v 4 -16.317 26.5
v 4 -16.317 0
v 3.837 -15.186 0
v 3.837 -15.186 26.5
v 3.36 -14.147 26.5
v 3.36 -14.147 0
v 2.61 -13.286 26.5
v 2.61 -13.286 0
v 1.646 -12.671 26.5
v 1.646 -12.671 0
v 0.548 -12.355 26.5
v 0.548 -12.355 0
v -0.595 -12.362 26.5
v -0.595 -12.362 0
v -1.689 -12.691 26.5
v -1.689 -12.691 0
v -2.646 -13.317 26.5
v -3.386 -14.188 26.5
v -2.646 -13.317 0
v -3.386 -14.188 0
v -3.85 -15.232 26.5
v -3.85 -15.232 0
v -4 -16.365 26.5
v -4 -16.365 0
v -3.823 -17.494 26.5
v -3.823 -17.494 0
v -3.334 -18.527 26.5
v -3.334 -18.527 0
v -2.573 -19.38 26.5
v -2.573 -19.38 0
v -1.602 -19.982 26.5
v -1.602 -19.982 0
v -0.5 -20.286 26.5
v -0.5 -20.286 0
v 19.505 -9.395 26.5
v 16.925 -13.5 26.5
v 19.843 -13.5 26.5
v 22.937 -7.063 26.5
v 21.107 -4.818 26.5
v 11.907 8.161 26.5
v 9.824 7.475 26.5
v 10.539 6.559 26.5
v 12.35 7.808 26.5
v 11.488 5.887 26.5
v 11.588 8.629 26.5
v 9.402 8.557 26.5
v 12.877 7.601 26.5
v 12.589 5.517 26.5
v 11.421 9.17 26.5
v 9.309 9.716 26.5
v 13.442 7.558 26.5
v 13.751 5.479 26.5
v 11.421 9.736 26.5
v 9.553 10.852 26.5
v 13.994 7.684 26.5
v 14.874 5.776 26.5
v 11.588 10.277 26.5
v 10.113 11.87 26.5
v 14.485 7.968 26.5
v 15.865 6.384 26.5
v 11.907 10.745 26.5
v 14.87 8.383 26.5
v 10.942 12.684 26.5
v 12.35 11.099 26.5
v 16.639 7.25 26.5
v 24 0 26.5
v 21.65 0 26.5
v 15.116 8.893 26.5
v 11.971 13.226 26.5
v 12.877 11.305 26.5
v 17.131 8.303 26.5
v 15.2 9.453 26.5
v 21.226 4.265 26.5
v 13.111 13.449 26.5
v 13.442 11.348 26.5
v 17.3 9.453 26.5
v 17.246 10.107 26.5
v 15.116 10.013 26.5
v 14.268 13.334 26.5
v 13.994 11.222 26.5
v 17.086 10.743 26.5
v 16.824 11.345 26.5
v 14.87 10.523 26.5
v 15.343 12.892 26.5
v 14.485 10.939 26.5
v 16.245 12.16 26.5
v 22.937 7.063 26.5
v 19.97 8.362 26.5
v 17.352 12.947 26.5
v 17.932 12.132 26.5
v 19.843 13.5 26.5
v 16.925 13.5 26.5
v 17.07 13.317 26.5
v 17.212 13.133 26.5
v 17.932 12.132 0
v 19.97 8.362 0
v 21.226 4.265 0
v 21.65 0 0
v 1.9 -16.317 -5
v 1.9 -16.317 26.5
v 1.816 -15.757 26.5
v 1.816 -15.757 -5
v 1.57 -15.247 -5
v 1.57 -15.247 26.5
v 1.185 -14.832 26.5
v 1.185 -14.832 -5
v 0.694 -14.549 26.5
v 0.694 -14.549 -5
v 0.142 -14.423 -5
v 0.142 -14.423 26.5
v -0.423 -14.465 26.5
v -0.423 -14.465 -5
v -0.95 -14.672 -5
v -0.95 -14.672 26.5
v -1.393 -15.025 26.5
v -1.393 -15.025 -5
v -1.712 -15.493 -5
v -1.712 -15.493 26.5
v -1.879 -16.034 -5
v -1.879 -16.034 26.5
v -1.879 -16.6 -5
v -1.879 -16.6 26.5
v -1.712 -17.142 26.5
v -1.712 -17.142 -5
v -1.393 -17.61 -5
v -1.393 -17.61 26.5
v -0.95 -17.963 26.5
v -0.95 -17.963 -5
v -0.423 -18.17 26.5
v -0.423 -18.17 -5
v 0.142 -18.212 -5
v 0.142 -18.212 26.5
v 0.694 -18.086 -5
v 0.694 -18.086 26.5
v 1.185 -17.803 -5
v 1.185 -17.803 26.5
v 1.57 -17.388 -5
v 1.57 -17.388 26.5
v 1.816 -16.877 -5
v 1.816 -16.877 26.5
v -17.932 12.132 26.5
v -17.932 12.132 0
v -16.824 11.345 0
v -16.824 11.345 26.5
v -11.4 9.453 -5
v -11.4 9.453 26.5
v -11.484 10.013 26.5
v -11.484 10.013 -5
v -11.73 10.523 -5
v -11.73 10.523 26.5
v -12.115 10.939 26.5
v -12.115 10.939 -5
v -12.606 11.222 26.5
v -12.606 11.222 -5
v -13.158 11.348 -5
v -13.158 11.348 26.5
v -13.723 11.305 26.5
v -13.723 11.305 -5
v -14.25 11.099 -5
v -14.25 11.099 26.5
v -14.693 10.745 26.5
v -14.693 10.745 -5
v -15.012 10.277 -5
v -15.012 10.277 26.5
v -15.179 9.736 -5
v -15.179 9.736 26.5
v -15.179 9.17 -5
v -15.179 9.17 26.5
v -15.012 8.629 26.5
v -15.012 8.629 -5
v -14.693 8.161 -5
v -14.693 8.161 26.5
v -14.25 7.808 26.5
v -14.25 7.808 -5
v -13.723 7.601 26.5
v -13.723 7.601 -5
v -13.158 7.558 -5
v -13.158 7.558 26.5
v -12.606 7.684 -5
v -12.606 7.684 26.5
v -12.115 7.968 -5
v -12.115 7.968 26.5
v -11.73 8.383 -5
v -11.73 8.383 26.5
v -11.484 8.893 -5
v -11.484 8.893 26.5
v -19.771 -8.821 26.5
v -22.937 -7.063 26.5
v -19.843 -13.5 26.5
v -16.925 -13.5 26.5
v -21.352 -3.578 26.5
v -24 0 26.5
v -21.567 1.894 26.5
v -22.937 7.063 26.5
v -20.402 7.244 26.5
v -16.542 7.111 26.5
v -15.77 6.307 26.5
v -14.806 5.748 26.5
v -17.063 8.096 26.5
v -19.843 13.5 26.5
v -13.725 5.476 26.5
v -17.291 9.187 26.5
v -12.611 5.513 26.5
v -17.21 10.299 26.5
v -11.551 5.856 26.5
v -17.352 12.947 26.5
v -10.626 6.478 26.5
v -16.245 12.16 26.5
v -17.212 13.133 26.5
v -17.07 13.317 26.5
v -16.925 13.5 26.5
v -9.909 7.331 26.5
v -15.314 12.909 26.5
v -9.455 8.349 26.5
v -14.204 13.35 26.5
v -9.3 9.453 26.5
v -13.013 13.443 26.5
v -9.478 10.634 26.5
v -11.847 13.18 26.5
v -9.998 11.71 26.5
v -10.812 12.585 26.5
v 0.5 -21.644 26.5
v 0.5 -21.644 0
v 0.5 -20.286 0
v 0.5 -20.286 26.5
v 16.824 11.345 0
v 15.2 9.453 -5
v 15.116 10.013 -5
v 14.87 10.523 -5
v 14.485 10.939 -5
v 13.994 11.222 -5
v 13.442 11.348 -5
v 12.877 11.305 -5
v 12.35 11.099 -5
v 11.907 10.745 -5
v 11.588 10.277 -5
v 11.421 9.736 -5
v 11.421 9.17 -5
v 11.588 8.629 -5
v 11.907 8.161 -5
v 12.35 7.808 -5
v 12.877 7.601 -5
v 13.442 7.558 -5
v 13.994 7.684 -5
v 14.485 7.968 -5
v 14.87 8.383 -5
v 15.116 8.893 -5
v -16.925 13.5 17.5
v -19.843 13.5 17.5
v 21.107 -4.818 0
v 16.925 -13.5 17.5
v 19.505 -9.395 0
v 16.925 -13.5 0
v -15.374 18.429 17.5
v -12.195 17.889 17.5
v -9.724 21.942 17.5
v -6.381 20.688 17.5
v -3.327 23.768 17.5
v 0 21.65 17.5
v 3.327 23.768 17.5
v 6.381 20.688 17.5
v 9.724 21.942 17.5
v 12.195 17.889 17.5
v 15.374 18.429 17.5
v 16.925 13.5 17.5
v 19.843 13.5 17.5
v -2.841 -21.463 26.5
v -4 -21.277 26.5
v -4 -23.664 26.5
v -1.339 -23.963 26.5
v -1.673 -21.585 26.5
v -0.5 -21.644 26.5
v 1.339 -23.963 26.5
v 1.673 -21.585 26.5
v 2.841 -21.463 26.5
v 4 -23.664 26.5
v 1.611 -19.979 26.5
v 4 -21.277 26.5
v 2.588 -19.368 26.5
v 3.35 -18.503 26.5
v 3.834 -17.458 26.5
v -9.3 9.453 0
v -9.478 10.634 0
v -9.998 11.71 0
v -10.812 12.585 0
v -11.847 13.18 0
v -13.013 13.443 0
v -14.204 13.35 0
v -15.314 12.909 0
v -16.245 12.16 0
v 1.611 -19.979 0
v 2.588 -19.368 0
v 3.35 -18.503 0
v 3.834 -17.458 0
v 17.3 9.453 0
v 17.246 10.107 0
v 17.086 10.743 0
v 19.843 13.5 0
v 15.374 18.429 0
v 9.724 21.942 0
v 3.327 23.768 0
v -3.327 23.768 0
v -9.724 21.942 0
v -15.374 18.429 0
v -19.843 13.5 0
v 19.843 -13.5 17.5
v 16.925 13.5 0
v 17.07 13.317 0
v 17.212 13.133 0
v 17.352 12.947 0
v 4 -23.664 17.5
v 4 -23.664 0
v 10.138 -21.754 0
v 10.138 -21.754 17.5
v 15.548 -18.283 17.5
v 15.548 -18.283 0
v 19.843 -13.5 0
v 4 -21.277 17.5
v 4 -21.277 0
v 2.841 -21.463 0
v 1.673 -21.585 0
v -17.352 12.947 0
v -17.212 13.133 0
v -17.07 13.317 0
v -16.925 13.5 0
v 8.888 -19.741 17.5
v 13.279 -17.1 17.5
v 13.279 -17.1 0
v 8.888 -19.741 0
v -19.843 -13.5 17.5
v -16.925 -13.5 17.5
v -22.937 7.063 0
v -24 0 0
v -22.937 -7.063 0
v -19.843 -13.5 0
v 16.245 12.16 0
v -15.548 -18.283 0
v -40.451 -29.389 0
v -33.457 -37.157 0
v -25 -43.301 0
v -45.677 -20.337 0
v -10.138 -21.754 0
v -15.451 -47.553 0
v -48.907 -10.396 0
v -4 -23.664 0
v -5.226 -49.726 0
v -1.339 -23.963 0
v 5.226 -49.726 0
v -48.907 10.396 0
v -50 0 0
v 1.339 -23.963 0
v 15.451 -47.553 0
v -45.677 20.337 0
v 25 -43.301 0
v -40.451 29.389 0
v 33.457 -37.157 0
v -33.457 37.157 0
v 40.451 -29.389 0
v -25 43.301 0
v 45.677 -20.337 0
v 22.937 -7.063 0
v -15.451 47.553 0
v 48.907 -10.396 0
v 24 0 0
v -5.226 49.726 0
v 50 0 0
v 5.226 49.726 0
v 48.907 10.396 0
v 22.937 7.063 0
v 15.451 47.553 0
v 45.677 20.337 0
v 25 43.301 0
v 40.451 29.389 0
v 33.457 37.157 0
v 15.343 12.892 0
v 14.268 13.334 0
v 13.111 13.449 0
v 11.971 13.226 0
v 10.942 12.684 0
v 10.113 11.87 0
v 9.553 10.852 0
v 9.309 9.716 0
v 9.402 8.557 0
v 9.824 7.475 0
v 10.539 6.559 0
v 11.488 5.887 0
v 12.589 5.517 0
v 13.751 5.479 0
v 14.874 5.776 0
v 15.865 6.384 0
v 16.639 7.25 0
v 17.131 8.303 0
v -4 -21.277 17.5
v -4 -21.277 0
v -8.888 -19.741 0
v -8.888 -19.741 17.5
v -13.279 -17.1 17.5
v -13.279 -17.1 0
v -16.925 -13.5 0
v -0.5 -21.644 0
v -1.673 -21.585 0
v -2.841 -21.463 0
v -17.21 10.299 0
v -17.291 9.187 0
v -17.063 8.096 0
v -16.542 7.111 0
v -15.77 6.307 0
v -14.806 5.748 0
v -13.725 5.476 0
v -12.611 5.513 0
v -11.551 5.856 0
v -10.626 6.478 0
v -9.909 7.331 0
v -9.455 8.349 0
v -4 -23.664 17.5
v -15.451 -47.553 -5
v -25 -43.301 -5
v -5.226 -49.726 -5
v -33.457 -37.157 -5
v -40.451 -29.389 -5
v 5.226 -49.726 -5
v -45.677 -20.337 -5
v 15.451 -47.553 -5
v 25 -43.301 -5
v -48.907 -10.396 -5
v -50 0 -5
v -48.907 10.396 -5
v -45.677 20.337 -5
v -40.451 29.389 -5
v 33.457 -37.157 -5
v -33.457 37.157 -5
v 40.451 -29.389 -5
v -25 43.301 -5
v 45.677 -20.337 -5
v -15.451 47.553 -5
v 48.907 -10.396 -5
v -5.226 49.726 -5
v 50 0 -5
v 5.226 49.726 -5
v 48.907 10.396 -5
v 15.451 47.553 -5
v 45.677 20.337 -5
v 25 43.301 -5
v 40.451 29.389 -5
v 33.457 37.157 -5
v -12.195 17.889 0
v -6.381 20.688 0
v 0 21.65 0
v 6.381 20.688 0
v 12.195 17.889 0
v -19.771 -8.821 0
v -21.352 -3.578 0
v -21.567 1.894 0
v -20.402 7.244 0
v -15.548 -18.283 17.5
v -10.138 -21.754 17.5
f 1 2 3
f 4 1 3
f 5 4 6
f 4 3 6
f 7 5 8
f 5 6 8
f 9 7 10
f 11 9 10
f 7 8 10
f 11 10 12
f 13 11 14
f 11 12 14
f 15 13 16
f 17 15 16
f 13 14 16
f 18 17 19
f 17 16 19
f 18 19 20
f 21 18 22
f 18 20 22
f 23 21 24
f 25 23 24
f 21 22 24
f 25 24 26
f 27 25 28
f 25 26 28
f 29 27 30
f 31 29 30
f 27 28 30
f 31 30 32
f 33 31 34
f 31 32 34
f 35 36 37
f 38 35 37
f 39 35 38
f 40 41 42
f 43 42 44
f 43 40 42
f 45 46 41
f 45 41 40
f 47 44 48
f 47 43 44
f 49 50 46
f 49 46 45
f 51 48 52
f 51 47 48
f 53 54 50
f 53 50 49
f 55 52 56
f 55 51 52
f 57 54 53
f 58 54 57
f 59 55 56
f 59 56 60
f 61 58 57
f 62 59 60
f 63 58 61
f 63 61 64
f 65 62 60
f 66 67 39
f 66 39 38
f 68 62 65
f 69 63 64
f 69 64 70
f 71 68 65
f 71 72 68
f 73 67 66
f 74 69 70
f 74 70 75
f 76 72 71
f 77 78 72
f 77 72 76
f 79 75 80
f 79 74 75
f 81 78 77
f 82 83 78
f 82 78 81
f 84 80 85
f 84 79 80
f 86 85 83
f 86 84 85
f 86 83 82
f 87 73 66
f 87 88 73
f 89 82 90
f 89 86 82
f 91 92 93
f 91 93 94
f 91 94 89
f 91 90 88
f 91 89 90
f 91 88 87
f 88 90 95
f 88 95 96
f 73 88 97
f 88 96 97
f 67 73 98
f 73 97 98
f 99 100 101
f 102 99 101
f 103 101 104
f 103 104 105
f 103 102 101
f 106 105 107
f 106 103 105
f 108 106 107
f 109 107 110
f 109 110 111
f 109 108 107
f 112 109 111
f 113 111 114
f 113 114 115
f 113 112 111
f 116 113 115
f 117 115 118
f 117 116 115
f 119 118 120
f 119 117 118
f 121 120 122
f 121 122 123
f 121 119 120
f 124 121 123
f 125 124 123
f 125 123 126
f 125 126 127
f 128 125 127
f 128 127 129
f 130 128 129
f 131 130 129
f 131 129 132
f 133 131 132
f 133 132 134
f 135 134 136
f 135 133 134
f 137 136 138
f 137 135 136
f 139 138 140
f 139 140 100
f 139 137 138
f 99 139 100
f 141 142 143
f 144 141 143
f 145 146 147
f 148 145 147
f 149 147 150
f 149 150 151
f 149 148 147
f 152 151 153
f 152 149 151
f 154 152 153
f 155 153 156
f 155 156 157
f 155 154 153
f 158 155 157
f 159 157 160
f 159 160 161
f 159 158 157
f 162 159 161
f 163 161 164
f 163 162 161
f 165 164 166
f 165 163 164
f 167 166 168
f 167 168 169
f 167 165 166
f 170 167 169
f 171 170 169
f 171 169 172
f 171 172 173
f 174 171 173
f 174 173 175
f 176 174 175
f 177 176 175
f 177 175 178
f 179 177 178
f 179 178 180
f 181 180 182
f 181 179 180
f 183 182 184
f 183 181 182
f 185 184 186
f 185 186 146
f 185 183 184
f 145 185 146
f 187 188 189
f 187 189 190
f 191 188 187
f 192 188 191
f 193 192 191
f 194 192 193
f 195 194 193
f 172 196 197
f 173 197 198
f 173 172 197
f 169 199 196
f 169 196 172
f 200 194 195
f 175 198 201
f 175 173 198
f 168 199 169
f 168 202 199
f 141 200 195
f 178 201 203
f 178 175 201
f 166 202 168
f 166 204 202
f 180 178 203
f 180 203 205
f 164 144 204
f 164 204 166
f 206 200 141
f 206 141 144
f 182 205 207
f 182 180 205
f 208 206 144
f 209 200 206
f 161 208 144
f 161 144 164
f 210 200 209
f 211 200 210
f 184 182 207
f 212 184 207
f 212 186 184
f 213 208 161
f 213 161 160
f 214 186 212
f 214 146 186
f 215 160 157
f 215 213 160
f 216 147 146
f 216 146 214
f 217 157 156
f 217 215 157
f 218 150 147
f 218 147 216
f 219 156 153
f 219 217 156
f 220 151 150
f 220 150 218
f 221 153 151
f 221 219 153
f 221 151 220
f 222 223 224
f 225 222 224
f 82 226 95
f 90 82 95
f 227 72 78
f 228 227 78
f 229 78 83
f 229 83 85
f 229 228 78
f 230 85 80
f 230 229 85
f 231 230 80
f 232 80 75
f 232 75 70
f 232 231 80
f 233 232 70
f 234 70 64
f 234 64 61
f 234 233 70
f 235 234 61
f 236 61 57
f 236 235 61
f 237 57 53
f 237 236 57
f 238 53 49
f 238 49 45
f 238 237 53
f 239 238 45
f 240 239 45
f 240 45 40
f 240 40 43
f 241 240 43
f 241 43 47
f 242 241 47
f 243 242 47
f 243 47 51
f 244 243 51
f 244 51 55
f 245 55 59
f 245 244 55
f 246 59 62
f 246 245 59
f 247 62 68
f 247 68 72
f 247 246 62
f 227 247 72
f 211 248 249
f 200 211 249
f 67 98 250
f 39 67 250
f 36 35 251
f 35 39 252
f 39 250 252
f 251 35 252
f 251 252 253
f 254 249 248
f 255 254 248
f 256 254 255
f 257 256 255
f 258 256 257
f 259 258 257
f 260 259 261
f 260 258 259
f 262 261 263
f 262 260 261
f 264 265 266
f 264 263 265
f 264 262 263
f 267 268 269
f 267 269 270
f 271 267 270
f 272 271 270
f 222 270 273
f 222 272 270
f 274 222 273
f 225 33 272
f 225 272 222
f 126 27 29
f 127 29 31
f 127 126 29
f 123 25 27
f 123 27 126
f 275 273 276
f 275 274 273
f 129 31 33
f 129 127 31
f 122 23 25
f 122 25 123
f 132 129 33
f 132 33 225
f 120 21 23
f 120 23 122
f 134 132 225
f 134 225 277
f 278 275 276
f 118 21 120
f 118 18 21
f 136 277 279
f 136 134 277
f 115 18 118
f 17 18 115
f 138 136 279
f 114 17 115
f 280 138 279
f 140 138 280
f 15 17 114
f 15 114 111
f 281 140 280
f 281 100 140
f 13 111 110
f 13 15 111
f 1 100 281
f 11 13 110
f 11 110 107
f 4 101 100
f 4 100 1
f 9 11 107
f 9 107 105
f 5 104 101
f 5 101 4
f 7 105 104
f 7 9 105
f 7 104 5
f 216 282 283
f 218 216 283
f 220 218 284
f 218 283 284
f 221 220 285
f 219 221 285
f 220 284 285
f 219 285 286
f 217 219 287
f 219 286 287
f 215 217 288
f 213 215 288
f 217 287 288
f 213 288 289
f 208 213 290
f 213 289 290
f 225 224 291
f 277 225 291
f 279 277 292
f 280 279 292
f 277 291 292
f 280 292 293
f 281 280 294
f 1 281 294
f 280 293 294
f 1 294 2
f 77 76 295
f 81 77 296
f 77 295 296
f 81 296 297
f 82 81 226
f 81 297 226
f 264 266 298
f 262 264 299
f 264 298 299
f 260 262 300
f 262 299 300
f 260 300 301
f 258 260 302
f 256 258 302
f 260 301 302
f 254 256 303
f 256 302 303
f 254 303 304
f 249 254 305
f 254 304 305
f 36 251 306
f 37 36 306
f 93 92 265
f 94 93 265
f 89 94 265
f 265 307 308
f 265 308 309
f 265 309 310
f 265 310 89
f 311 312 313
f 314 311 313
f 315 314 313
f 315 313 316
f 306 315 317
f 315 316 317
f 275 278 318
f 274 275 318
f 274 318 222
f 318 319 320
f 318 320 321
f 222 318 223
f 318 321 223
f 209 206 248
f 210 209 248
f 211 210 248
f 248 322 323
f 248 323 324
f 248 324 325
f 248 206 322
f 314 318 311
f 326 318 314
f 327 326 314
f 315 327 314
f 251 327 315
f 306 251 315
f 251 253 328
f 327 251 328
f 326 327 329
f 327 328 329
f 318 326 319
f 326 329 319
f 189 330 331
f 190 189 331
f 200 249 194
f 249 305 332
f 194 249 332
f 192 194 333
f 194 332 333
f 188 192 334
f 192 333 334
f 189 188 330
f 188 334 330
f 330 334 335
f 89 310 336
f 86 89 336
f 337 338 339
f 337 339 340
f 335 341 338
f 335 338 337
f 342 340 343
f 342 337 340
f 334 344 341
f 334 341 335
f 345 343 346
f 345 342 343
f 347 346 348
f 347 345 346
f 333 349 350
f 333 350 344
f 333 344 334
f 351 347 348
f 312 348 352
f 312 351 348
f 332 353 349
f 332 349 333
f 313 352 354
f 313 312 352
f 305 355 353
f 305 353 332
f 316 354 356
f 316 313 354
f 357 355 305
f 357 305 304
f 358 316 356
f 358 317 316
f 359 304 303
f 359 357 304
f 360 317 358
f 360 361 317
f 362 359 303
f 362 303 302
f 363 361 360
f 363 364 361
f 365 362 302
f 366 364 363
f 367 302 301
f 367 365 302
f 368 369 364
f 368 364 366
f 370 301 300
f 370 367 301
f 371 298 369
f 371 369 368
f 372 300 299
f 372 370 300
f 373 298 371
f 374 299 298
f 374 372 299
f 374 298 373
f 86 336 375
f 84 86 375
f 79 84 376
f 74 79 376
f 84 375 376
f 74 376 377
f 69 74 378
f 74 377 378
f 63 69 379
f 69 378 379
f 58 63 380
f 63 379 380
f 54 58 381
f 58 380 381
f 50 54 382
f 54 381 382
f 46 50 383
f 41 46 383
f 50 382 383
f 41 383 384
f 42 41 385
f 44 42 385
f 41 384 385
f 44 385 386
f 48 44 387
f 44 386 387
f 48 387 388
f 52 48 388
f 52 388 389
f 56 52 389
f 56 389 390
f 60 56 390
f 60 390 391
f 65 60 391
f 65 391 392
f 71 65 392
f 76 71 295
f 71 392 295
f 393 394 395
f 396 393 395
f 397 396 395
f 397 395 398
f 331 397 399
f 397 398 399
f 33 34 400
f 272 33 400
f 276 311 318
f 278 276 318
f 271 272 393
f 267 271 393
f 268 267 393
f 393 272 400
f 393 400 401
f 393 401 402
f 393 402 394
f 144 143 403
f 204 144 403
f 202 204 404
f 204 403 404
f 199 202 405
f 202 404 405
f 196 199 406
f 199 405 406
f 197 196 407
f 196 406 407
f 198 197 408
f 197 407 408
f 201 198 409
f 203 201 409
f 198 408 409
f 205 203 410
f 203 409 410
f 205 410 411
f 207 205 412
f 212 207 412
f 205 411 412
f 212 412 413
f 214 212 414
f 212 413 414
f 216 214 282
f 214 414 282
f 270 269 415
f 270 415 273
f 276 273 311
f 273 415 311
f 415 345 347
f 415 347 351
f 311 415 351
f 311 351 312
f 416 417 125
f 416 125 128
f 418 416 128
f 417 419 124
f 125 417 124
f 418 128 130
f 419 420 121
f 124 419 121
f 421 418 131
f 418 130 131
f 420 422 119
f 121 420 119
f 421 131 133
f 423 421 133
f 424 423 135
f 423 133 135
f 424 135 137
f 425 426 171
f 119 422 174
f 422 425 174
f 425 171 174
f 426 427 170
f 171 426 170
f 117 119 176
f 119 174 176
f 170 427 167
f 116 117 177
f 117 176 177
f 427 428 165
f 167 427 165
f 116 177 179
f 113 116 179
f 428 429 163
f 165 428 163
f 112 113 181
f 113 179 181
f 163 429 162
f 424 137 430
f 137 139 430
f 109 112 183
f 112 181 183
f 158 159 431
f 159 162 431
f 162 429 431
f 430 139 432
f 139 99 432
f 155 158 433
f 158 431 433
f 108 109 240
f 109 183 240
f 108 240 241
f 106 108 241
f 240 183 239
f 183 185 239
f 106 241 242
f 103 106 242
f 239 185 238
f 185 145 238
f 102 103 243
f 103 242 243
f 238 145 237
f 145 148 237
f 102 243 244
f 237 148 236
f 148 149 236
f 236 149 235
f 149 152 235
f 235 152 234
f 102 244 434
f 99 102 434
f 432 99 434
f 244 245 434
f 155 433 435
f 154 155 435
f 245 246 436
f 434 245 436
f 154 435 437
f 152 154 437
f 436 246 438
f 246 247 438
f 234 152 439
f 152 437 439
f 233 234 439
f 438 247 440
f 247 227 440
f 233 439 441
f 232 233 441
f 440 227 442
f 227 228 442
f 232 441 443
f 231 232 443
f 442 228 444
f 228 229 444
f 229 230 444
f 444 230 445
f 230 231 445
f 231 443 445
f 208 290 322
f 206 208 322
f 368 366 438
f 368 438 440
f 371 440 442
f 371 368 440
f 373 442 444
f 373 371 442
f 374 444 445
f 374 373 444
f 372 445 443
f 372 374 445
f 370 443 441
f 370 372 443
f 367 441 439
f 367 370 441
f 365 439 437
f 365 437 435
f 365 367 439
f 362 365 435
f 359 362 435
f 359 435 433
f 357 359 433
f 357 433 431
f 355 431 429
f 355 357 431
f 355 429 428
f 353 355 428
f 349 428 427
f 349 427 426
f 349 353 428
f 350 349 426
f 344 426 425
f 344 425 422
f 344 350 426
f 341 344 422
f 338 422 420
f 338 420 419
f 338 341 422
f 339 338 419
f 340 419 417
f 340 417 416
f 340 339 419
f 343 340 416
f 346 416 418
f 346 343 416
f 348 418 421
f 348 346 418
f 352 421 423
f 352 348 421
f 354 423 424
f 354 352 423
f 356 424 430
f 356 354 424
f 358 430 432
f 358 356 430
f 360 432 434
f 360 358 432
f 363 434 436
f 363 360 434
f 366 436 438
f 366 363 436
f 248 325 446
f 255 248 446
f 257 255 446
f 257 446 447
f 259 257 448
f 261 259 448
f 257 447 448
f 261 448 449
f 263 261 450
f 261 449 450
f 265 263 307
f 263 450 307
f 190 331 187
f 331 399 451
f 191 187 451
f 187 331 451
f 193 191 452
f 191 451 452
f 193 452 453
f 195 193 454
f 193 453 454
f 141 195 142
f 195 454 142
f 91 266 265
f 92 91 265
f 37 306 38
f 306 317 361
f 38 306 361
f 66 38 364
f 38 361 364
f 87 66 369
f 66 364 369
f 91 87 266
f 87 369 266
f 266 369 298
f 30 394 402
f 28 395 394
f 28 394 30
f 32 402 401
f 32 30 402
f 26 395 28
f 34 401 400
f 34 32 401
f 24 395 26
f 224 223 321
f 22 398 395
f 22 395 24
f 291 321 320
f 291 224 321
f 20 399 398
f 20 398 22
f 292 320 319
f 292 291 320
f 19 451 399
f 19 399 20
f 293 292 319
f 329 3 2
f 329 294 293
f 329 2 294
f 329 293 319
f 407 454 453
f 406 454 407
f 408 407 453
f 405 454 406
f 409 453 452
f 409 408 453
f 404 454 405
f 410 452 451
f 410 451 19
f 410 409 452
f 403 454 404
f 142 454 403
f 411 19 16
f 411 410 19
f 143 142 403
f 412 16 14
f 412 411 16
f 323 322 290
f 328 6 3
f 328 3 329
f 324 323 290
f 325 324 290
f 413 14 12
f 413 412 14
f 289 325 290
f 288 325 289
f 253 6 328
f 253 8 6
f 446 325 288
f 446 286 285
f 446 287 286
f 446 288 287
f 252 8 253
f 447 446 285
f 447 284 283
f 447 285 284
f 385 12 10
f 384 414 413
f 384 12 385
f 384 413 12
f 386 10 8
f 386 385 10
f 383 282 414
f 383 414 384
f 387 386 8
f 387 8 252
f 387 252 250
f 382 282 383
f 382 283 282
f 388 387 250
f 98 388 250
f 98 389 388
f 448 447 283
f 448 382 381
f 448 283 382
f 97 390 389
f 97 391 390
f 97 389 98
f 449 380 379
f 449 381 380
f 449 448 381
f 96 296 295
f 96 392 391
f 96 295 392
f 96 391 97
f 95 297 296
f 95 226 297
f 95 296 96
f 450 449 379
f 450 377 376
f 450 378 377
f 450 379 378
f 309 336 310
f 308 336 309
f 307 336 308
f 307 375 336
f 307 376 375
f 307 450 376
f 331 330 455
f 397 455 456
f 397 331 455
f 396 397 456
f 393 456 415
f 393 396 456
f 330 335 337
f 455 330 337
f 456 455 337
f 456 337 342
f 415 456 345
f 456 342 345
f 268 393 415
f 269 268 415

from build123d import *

# Parameters (mm, degrees)
F0_R     = 50
F0_R_2   = 1.9
F1_DEPTH = 5
F2_DEPTH = 17.5
F3_DEPTH = 26.5


# Not quite as in the source:
# - a feature names something its author has since deleted; it is built from what else it names


with BuildPart() as f1:
    # F0 (on Top) → F1 (new body)
    with BuildSketch(Plane.XY):
        Circle(F0_R)
        with BuildLine():
            ThreePointArc((19.843134833, 13.5), (22.9372539332, 7.0627460668), (24, 0))
            ThreePointArc((24, 0), (22.9372539332, -7.0627460668), (19.843134833, -13.5))
            ThreePointArc((19.843134833, -13.5), (12.9596340813, -20.2001951594), (4, -23.6643191324))
            ThreePointArc((4, -23.6643191324), (0, -24), (-4, -23.6643191324))
            ThreePointArc((-4, -23.6643191324), (-12.9596340813, -20.2001951594), (-19.843134833, -13.5))
            ThreePointArc((-19.843134833, -13.5), (-24, 0), (-19.843134833, 13.5))
            ThreePointArc((-19.843134833, 13.5), (0, 24), (19.843134833, 13.5))
        make_face(mode=Mode.SUBTRACT)
        with BuildLine():
            ThreePointArc((4, -23.6643191324), (12.9596340813, -20.2001951594), (19.843134833, -13.5))
            Line((19.843134833, -13.5), (16.9254985156, -13.5))
            ThreePointArc((16.9254985156, -13.5), (11.1620172865, -18.5507916299), (4, -21.2772766114))
            Line((4, -21.2772766114), (4, -23.6643191324))
        make_face()
        with BuildLine():
            ThreePointArc((19.843134833, -13.5), (22.9372539332, -7.0627460668), (24, 0))
            ThreePointArc((24, 0), (22.9372539332, 7.0627460668), (19.843134833, 13.5))
            Line((19.843134833, 13.5), (16.9254985156, 13.5))
            ThreePointArc((16.9254985156, 13.5), (17.1411453437, 13.2251138485), (17.3523282296, 12.9467835778))
            ThreePointArc((17.3523282296, 12.9467835778), (17.6467019836, 12.5425838288), (17.9316623557, 12.1316934169))
            ThreePointArc((17.9316623557, 12.1316934169), (20.6995530145, 6.3443679748), (21.65, 0))
            ThreePointArc((21.65, 0), (20.4347686904, -7.1514144453), (16.9254985156, -13.5))
            Line((16.9254985156, -13.5), (19.843134833, -13.5))
        make_face()
        with BuildLine():
            ThreePointArc((17.3523282296, 12.9467835778), (17.1411453437, 13.2251138485), (16.9254985156, 13.5))
            ThreePointArc((16.9254985156, 13.5), (0, 21.65), (-16.9254985156, 13.5))
            ThreePointArc((-16.9254985156, 13.5), (-17.1411453437, 13.2251138485), (-17.3523282296, 12.9467835778))
            Line((-17.3523282296, 12.9467835778), (-16.2451217298, 12.1598246122))
            ThreePointArc((-16.2451217298, 12.1598246122), (-11.8474999, 13.1800801892), (-9.3, 9.4531184965))
            ThreePointArc((-9.3, 9.4531184965), (-14.2752375549, 5.5738258146), (-16.8244558558, 11.3447344513))
            Line((-16.8244558558, 11.3447344513), (-17.9316623557, 12.1316934169))
            ThreePointArc((-17.9316623557, 12.1316934169), (-21.6333386895, -0.8492097177), (-16.9254985156, -13.5))
            ThreePointArc((-16.9254985156, -13.5), (-11.1620172865, -18.5507916299), (-4, -21.2772766114))
            ThreePointArc((-4, -21.2772766114), (-2.2574682461, -21.5319840497), (-0.5, -21.6442255579))
            Line((-0.5, -21.6442255579), (-0.5, -20.2858402491))
            ThreePointArc((-0.5, -20.2858402491), (-2.6457513111, -13.3172132825), (4, -16.3172132825))
            ThreePointArc((4, -16.3172132825), (3, -18.9629645936), (0.5, -20.2858402491))
            Line((0.5, -20.2858402491), (0.5, -21.6442255579))
            ThreePointArc((0.5, -21.6442255579), (2.2574682461, -21.5319840497), (4, -21.2772766114))
            ThreePointArc((4, -21.2772766114), (11.1620172865, -18.5507916299), (16.9254985156, -13.5))
            ThreePointArc((16.9254985156, -13.5), (20.4347686904, -7.1514144453), (21.65, 0))
            ThreePointArc((21.65, 0), (20.6995530145, 6.3443679748), (17.9316623557, 12.1316934169))
            Line((17.9316623557, 12.1316934169), (16.8244558558, 11.3447344513))
            ThreePointArc((16.8244558558, 11.3447344513), (17.1792926819, 10.4283560513), (17.3, 9.4531184965))
            ThreePointArc((17.3, 9.4531184965), (9.5730383072, 8.0006183965), (16.2451217298, 12.1598246122))
            Line((16.2451217298, 12.1598246122), (17.3523282296, 12.9467835778))
        make_face()
        with BuildLine():
            Line((16.9254985156, 13.5), (19.843134833, 13.5))
            ThreePointArc((19.843134833, 13.5), (0, 24), (-19.843134833, 13.5))
            Line((-19.843134833, 13.5), (-16.9254985156, 13.5))
            ThreePointArc((-16.9254985156, 13.5), (0, 21.65), (16.9254985156, 13.5))
        make_face()
        with BuildLine():
            ThreePointArc((-9.3, 9.4531184965), (-11.8474999, 13.1800801892), (-16.2451217298, 12.1598246122))
            ThreePointArc((-16.2451217298, 12.1598246122), (-16.5603606436, 11.7704550006), (-16.8244558558, 11.3447344513))
            ThreePointArc((-16.8244558558, 11.3447344513), (-14.2752375549, 5.5738258146), (-9.3, 9.4531184965))
        make_face()
        with Locations((-13.3, 9.4531184965)):
            Circle(F0_R_2, mode=Mode.SUBTRACT)
        with BuildLine():
            ThreePointArc((16.8244558558, 11.3447344513), (16.5603606436, 11.7704550006), (16.2451217298, 12.1598246122))
            ThreePointArc((16.2451217298, 12.1598246122), (9.5730383072, 8.0006183965), (17.3, 9.4531184965))
            ThreePointArc((17.3, 9.4531184965), (17.1792926819, 10.4283560513), (16.8244558558, 11.3447344513))
        make_face()
        with Locations((13.3, 9.4531184965)):
            Circle(F0_R_2, mode=Mode.SUBTRACT)
        with BuildLine():
            Line((-16.9254985156, 13.5), (-19.843134833, 13.5))
            ThreePointArc((-19.843134833, 13.5), (-24, 0), (-19.843134833, -13.5))
            Line((-19.843134833, -13.5), (-16.9254985156, -13.5))
            ThreePointArc((-16.9254985156, -13.5), (-21.6333386895, -0.8492097177), (-17.9316623557, 12.1316934169))
            ThreePointArc((-17.9316623557, 12.1316934169), (-17.6467019836, 12.5425838288), (-17.3523282296, 12.9467835778))
            ThreePointArc((-17.3523282296, 12.9467835778), (-17.1411453437, 13.2251138485), (-16.9254985156, 13.5))
        make_face()
        with BuildLine():
            Line((-16.9254985156, -13.5), (-19.843134833, -13.5))
            ThreePointArc((-19.843134833, -13.5), (-12.9596340813, -20.2001951594), (-4, -23.6643191324))
            Line((-4, -23.6643191324), (-4, -21.2772766114))
            ThreePointArc((-4, -21.2772766114), (-11.1620172865, -18.5507916299), (-16.9254985156, -13.5))
        make_face()
        with BuildLine():
            ThreePointArc((-4, -23.6643191324), (0, -24), (4, -23.6643191324))
            Line((4, -23.6643191324), (4, -21.2772766114))
            ThreePointArc((4, -21.2772766114), (2.2574682461, -21.5319840497), (0.5, -21.6442255579))
            ThreePointArc((0.5, -21.6442255579), (0, -21.65), (-0.5, -21.6442255579))
            ThreePointArc((-0.5, -21.6442255579), (-2.2574682461, -21.5319840497), (-4, -21.2772766114))
            Line((-4, -21.2772766114), (-4, -23.6643191324))
        make_face()
        with BuildLine():
            ThreePointArc((-0.5, -20.2858402491), (0, -20.3172132825), (0.5, -20.2858402491))
            ThreePointArc((0.5, -20.2858402491), (3, -18.9629645936), (4, -16.3172132825))
            ThreePointArc((4, -16.3172132825), (-2.6457513111, -13.3172132825), (-0.5, -20.2858402491))
        make_face()
        with Locations((0, -16.3172132825)):
            Circle(F0_R_2, mode=Mode.SUBTRACT)
        with BuildLine():
            ThreePointArc((-0.5, -21.6442255579), (0, -21.65), (0.5, -21.6442255579))
            Line((0.5, -21.6442255579), (0.5, -20.2858402491))
            ThreePointArc((0.5, -20.2858402491), (0, -20.3172132825), (-0.5, -20.2858402491))
            Line((-0.5, -20.2858402491), (-0.5, -21.6442255579))
        make_face()
        with BuildLine():
            ThreePointArc((17.9316623557, 12.1316934169), (17.6467019836, 12.5425838288), (17.3523282296, 12.9467835778))
            Line((17.3523282296, 12.9467835778), (16.2451217298, 12.1598246122))
            ThreePointArc((16.2451217298, 12.1598246122), (16.5603606436, 11.7704550006), (16.8244558558, 11.3447344513))
            Line((16.8244558558, 11.3447344513), (17.9316623557, 12.1316934169))
        make_face()
        with BuildLine():
            Line((-16.2451217298, 12.1598246122), (-17.3523282296, 12.9467835778))
            ThreePointArc((-17.3523282296, 12.9467835778), (-17.6467019836, 12.5425838288), (-17.9316623557, 12.1316934169))
            Line((-17.9316623557, 12.1316934169), (-16.8244558558, 11.3447344513))
            ThreePointArc((-16.8244558558, 11.3447344513), (-16.5603606436, 11.7704550006), (-16.2451217298, 12.1598246122))
        make_face()
    extrude(amount=-F1_DEPTH)

    # F0 (on Top) → F2 (join)
    with BuildSketch(Plane.XY):
        with BuildLine():
            ThreePointArc((4, -23.6643191324), (12.9596340813, -20.2001951594), (19.843134833, -13.5))
            Line((19.843134833, -13.5), (16.9254985156, -13.5))
            ThreePointArc((16.9254985156, -13.5), (11.1620172865, -18.5507916299), (4, -21.2772766114))
            Line((4, -21.2772766114), (4, -23.6643191324))
        make_face()
        with BuildLine():
            Line((-16.9254985156, -13.5), (-19.843134833, -13.5))
            ThreePointArc((-19.843134833, -13.5), (-12.9596340813, -20.2001951594), (-4, -23.6643191324))
            Line((-4, -23.6643191324), (-4, -21.2772766114))
            ThreePointArc((-4, -21.2772766114), (-11.1620172865, -18.5507916299), (-16.9254985156, -13.5))
        make_face()
        with BuildLine():
            Line((16.9254985156, 13.5), (19.843134833, 13.5))
            ThreePointArc((19.843134833, 13.5), (0, 24), (-19.843134833, 13.5))
            Line((-19.843134833, 13.5), (-16.9254985156, 13.5))
            ThreePointArc((-16.9254985156, 13.5), (0, 21.65), (16.9254985156, 13.5))
        make_face()
    extrude(amount=F2_DEPTH)

    # F0 (on Top) → F3 (join)
    with BuildSketch(Plane.XY):
        with BuildLine():
            Line((-16.9254985156, 13.5), (-19.843134833, 13.5))
            ThreePointArc((-19.843134833, 13.5), (-24, 0), (-19.843134833, -13.5))
            Line((-19.843134833, -13.5), (-16.9254985156, -13.5))
            ThreePointArc((-16.9254985156, -13.5), (-21.6333386895, -0.8492097177), (-17.9316623557, 12.1316934169))
            ThreePointArc((-17.9316623557, 12.1316934169), (-17.6467019836, 12.5425838288), (-17.3523282296, 12.9467835778))
            ThreePointArc((-17.3523282296, 12.9467835778), (-17.1411453437, 13.2251138485), (-16.9254985156, 13.5))
        make_face()
        with BuildLine():
            ThreePointArc((19.843134833, -13.5), (22.9372539332, -7.0627460668), (24, 0))
            ThreePointArc((24, 0), (22.9372539332, 7.0627460668), (19.843134833, 13.5))
            Line((19.843134833, 13.5), (16.9254985156, 13.5))
            ThreePointArc((16.9254985156, 13.5), (17.1411453437, 13.2251138485), (17.3523282296, 12.9467835778))
            ThreePointArc((17.3523282296, 12.9467835778), (17.6467019836, 12.5425838288), (17.9316623557, 12.1316934169))
            ThreePointArc((17.9316623557, 12.1316934169), (20.6995530145, 6.3443679748), (21.65, 0))
            ThreePointArc((21.65, 0), (20.4347686904, -7.1514144453), (16.9254985156, -13.5))
            Line((16.9254985156, -13.5), (19.843134833, -13.5))
        make_face()
        with BuildLine():
            ThreePointArc((16.8244558558, 11.3447344513), (16.5603606436, 11.7704550006), (16.2451217298, 12.1598246122))
            ThreePointArc((16.2451217298, 12.1598246122), (9.5730383072, 8.0006183965), (17.3, 9.4531184965))
            ThreePointArc((17.3, 9.4531184965), (17.1792926819, 10.4283560513), (16.8244558558, 11.3447344513))
        make_face()
        with Locations((13.3, 9.4531184965)):
            Circle(F0_R_2, mode=Mode.SUBTRACT)
        with BuildLine():
            ThreePointArc((-0.5, -20.2858402491), (0, -20.3172132825), (0.5, -20.2858402491))
            ThreePointArc((0.5, -20.2858402491), (3, -18.9629645936), (4, -16.3172132825))
            ThreePointArc((4, -16.3172132825), (-2.6457513111, -13.3172132825), (-0.5, -20.2858402491))
        make_face()
        with Locations((0, -16.3172132825)):
            Circle(F0_R_2, mode=Mode.SUBTRACT)
        with BuildLine():
            ThreePointArc((-0.5, -21.6442255579), (0, -21.65), (0.5, -21.6442255579))
            Line((0.5, -21.6442255579), (0.5, -20.2858402491))
            ThreePointArc((0.5, -20.2858402491), (0, -20.3172132825), (-0.5, -20.2858402491))
            Line((-0.5, -20.2858402491), (-0.5, -21.6442255579))
        make_face()
        with BuildLine():
            ThreePointArc((-4, -23.6643191324), (0, -24), (4, -23.6643191324))
            Line((4, -23.6643191324), (4, -21.2772766114))
            ThreePointArc((4, -21.2772766114), (2.2574682461, -21.5319840497), (0.5, -21.6442255579))
            ThreePointArc((0.5, -21.6442255579), (0, -21.65), (-0.5, -21.6442255579))
            ThreePointArc((-0.5, -21.6442255579), (-2.2574682461, -21.5319840497), (-4, -21.2772766114))
            Line((-4, -21.2772766114), (-4, -23.6643191324))
        make_face()
        with BuildLine():
            ThreePointArc((-9.3, 9.4531184965), (-11.8474999, 13.1800801892), (-16.2451217298, 12.1598246122))
            ThreePointArc((-16.2451217298, 12.1598246122), (-16.5603606436, 11.7704550006), (-16.8244558558, 11.3447344513))
            ThreePointArc((-16.8244558558, 11.3447344513), (-14.2752375549, 5.5738258146), (-9.3, 9.4531184965))
        make_face()
        with Locations((-13.3, 9.4531184965)):
            Circle(F0_R_2, mode=Mode.SUBTRACT)
        with BuildLine():
            Line((-16.2451217298, 12.1598246122), (-17.3523282296, 12.9467835778))
            ThreePointArc((-17.3523282296, 12.9467835778), (-17.6467019836, 12.5425838288), (-17.9316623557, 12.1316934169))
            Line((-17.9316623557, 12.1316934169), (-16.8244558558, 11.3447344513))
            ThreePointArc((-16.8244558558, 11.3447344513), (-16.5603606436, 11.7704550006), (-16.2451217298, 12.1598246122))
        make_face()
        with BuildLine():
            ThreePointArc((17.9316623557, 12.1316934169), (17.6467019836, 12.5425838288), (17.3523282296, 12.9467835778))
            Line((17.3523282296, 12.9467835778), (16.2451217298, 12.1598246122))
            ThreePointArc((16.2451217298, 12.1598246122), (16.5603606436, 11.7704550006), (16.8244558558, 11.3447344513))
            Line((16.8244558558, 11.3447344513), (17.9316623557, 12.1316934169))
        make_face()
    extrude(amount=F3_DEPTH)


solid = f1.part
